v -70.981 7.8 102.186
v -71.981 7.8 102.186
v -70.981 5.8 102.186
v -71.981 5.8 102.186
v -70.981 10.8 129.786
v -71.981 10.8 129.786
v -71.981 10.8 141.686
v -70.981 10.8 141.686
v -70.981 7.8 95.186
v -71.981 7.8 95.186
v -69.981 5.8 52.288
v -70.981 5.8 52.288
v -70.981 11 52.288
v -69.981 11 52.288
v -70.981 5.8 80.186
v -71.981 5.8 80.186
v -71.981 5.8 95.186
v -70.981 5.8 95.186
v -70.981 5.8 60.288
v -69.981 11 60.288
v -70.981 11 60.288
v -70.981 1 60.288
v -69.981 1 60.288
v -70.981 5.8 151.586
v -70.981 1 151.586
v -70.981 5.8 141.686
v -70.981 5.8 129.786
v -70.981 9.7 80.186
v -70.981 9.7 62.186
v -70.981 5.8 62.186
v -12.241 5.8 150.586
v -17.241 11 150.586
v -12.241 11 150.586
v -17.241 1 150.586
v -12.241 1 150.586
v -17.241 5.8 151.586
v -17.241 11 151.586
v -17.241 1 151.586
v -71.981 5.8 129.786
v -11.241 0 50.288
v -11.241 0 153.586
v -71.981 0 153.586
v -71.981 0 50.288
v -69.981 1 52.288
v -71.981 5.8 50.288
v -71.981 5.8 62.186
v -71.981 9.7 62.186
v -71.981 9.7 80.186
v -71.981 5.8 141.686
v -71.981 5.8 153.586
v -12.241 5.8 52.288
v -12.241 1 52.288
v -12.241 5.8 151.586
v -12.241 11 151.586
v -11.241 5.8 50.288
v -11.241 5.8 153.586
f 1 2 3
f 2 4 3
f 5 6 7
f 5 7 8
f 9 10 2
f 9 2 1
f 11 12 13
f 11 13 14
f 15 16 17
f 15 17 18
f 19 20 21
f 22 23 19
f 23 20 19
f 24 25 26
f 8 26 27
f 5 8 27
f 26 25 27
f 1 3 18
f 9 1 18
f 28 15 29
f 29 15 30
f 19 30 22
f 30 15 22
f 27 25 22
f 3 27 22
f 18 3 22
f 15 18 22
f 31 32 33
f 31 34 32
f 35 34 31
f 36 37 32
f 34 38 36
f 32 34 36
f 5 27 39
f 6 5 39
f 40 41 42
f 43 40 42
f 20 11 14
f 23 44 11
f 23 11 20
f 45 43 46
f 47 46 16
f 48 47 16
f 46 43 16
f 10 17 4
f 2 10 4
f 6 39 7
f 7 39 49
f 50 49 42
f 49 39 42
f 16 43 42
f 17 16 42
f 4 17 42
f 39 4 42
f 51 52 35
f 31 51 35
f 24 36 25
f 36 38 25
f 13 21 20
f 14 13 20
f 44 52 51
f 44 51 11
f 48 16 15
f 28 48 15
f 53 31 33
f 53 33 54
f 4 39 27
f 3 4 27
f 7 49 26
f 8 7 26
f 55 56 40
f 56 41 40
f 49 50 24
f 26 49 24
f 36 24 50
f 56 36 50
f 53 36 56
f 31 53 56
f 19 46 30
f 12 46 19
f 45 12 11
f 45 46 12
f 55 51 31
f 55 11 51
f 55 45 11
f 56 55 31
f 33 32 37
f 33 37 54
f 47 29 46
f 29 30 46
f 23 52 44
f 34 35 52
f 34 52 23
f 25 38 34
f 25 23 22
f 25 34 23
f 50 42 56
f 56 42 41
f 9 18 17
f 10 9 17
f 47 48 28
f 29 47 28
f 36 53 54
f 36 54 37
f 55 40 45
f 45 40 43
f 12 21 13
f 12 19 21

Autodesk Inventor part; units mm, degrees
ref_plane "YZ Plane" through (0, 0, 0) normal (1, 0, 0) x (0, 1, 0)
ref_plane "XZ Plane" through (0, 0, 0) normal (0, 1, 0) x (-1, 0, 0)
ref_plane "XY Plane" through (0, 0, 0) normal (0, 0, 1) x (1, 0, 0)
sketch "Sketch1" plane through (0, 0, 0) normal (0, 1, 0) x (-1, 0, 0)
  line L0 (71.9808, 153.586) -> (11.2408, 153.586)
  line L1 (11.2408, 153.586) -> (11.2408, 50.288)
  line L2 (11.2408, 50.288) -> (71.9808, 50.288)
  line L3 (71.9808, 50.288) -> (71.9808, 153.586)
  point P0 (0, 0)
  dimension "d0" = 60.74
  dimension "d1" = 103.298
extrude "Extrusion1" add sketch "Sketch1" along normal blind 1
sketch "Sketch2" plane through (0, 1, 0) normal (0, 1, 0) x (1, 0, 0)
  line L0 (-71.9808, -50.288) -> (-71.9808, -153.586) projected
  line L1 (-11.2408, -153.586) -> (-11.2408, -50.288) projected
  line L2 (-71.9808, -153.586) -> (-11.2408, -153.586)
  line L3 (-11.2408, -153.586) -> (-11.2408, -151.586)
  line L4 (-11.2408, -151.586) -> (-71.9808, -151.586)
  line L5 (-71.9808, -151.586) -> (-71.9808, -153.586)
  line L6 (-11.2408, -50.288) -> (-71.9808, -50.288) projected
  line L7 (-71.9808, -151.586) -> (-70.9808, -151.586)
  line L8 (-70.9808, -151.586) -> (-70.9808, -50.288)
  line L9 (-70.9808, -50.288) -> (-71.9808, -50.288)
  line L10 (-71.9808, -50.288) -> (-71.9808, -151.586)
  line L11 (-70.9808, -50.288) -> (-11.2408, -50.288)
  line L12 (-11.2408, -50.288) -> (-11.2408, -52.288)
  line L13 (-11.2408, -52.288) -> (-70.9808, -52.288)
  line L14 (-70.9808, -52.288) -> (-70.9808, -50.288)
  line L15 (-11.2408, -52.288) -> (-12.2408, -52.288)
  line L16 (-12.2408, -52.288) -> (-12.2408, -151.586)
  line L17 (-12.2408, -151.586) -> (-11.2408, -151.586)
  line L18 (-11.2408, -151.586) -> (-11.2408, -52.288)
  point P0 (0, 0)
  dimension "d4" = 2
  dimension "d5" = 1
  dimension "d6" = 2
  dimension "d7" = 1
extrude "Extrusion2" add sketch "Sketch2" along normal blind 4.8 contours L6 L8 L4 L0 | L4 L1 L2 L0 | L6 L1 L13 L8 | L16 L13 L1 L4
sketch "Sketch3" plane through (0, 5.8, 0) normal (0, 1, 0) x (1, 0, 0)
  line L0 (-71.9808, -50.288) -> (-71.9808, -153.586) projected
  line L1 (-71.9808, -153.586) -> (-71.9808, -141.686)
  line L2 (-70.9808, -52.288) -> (-70.9808, -151.586) projected
  line L3 (-71.9808, -141.686) -> (-70.9808, -141.686)
  line L4 (-70.9808, -141.686) -> (-70.9808, -129.786)
  line L5 (-70.9808, -129.786) -> (-71.9808, -129.786)
  line L6 (-71.9808, -129.786) -> (-71.9808, -141.686)
  point P0 (0, 0)
  point P1 (-71.4808, -129.786)
  point P2 (-71.4808, -141.686)
  dimension "d18" = 11.9
  dimension "d19" = 11.9
extrude "Extrusion3" add sketch "Sketch3" along normal blind 5
sketch "Sketch4" plane through (0, 5.8, 0) normal (0, 1, 0) x (1, 0, 0)
  line L0 (-71.9808, -129.786) -> (-71.9808, -116.586)
  line L1 (-71.9808, -50.288) -> (-71.9808, -129.786) projected
  line L2 (-70.9808, -129.786) -> (-70.9808, -52.288) projected
  line L3 (-71.9808, -116.586) -> (-70.9808, -116.586)
  line L4 (-70.9808, -116.586) -> (-70.9808, -110.586)
  line L5 (-70.9808, -110.586) -> (-71.9808, -110.586)
  line L6 (-71.9808, -110.586) -> (-71.9808, -116.586)
  line L7 (-71.9808, -110.586) -> (-71.9808, -102.186)
  line L8 (-71.9808, -102.186) -> (-70.9808, -102.186)
  line L9 (-70.9808, -102.186) -> (-70.9808, -95.186)
  line L10 (-70.9808, -95.186) -> (-71.9808, -95.186)
  line L11 (-71.9808, -95.186) -> (-71.9808, -102.186)
  point P0 (0, 0)
  point P1 (-71.4808, -110.586)
  point P2 (-71.4808, -116.586)
  point P3 (-71.4808, -95.186)
  point P4 (-71.4808, -102.186)
  dimension "d22" = 13.2
  dimension "d23" = 6
  dimension "d24" = 8.4
  dimension "d25" = 7
extrude "Extrusion4" add sketch "Sketch4" along normal blind 2 contours L10 L2 L8 L1
sketch "Sketch5" plane through (0, 5.8, 0) normal (0, 1, 0) x (1, 0, 0)
  line L0 (-71.9808, -95.186) -> (-71.9808, -102.186) projected
  line L1 (-71.9808, -95.186) -> (-71.9808, -80.186)
  line L2 (-71.9808, -50.288) -> (-71.9808, -95.186) projected
  line L3 (-70.9808, -95.186) -> (-70.9808, -52.288) projected
  line L4 (-71.9808, -80.186) -> (-70.9808, -80.186)
  line L5 (-70.9808, -80.186) -> (-70.9808, -62.186)
  line L6 (-70.9808, -62.186) -> (-71.9808, -62.186)
  line L7 (-71.9808, -62.186) -> (-71.9808, -80.186)
  point P0 (0, 0)
  point P1 (-71.4808, -62.186)
  point P2 (-71.4808, -80.186)
  dimension "d28" = 15
  dimension "d29" = 18
extrude "Extrusion5" add sketch "Sketch5" along normal blind 3.9
sketch "Sketch6" plane through (0, 1, 0) normal (0, 1, 0) x (1, 0, 0)
  line L0 (-70.9808, -62.186) -> (-70.9808, -52.288) projected
  line L1 (-70.9808, -52.288) -> (-69.9808, -52.288)
  line L2 (-69.9808, -52.288) -> (-69.9808, -60.288)
  line L3 (-69.9808, -60.288) -> (-70.9808, -60.288)
  line L4 (-70.9808, -60.288) -> (-70.9808, -52.288)
  line L5 (-12.2408, -151.586) -> (-17.2408, -151.586)
  line L6 (-17.2408, -151.586) -> (-17.2408, -150.586)
  line L7 (-17.2408, -150.586) -> (-12.2408, -150.586)
  line L8 (-12.2408, -150.586) -> (-12.2408, -151.586)
  point P0 (0, 0)
  point P1 (-70.4808, -52.288)
  point P2 (-70.4808, -60.288)
  point P3 (-17.2408, -151.086)
  point P4 (-12.2408, -151.086)
  dimension "d32" = 1
  dimension "d33" = 8
  dimension "d34" = 1
  dimension "d35" = 5
extrude "Extrusion6" add sketch "Sketch6" along normal blind 10
properties part number "lid top"
